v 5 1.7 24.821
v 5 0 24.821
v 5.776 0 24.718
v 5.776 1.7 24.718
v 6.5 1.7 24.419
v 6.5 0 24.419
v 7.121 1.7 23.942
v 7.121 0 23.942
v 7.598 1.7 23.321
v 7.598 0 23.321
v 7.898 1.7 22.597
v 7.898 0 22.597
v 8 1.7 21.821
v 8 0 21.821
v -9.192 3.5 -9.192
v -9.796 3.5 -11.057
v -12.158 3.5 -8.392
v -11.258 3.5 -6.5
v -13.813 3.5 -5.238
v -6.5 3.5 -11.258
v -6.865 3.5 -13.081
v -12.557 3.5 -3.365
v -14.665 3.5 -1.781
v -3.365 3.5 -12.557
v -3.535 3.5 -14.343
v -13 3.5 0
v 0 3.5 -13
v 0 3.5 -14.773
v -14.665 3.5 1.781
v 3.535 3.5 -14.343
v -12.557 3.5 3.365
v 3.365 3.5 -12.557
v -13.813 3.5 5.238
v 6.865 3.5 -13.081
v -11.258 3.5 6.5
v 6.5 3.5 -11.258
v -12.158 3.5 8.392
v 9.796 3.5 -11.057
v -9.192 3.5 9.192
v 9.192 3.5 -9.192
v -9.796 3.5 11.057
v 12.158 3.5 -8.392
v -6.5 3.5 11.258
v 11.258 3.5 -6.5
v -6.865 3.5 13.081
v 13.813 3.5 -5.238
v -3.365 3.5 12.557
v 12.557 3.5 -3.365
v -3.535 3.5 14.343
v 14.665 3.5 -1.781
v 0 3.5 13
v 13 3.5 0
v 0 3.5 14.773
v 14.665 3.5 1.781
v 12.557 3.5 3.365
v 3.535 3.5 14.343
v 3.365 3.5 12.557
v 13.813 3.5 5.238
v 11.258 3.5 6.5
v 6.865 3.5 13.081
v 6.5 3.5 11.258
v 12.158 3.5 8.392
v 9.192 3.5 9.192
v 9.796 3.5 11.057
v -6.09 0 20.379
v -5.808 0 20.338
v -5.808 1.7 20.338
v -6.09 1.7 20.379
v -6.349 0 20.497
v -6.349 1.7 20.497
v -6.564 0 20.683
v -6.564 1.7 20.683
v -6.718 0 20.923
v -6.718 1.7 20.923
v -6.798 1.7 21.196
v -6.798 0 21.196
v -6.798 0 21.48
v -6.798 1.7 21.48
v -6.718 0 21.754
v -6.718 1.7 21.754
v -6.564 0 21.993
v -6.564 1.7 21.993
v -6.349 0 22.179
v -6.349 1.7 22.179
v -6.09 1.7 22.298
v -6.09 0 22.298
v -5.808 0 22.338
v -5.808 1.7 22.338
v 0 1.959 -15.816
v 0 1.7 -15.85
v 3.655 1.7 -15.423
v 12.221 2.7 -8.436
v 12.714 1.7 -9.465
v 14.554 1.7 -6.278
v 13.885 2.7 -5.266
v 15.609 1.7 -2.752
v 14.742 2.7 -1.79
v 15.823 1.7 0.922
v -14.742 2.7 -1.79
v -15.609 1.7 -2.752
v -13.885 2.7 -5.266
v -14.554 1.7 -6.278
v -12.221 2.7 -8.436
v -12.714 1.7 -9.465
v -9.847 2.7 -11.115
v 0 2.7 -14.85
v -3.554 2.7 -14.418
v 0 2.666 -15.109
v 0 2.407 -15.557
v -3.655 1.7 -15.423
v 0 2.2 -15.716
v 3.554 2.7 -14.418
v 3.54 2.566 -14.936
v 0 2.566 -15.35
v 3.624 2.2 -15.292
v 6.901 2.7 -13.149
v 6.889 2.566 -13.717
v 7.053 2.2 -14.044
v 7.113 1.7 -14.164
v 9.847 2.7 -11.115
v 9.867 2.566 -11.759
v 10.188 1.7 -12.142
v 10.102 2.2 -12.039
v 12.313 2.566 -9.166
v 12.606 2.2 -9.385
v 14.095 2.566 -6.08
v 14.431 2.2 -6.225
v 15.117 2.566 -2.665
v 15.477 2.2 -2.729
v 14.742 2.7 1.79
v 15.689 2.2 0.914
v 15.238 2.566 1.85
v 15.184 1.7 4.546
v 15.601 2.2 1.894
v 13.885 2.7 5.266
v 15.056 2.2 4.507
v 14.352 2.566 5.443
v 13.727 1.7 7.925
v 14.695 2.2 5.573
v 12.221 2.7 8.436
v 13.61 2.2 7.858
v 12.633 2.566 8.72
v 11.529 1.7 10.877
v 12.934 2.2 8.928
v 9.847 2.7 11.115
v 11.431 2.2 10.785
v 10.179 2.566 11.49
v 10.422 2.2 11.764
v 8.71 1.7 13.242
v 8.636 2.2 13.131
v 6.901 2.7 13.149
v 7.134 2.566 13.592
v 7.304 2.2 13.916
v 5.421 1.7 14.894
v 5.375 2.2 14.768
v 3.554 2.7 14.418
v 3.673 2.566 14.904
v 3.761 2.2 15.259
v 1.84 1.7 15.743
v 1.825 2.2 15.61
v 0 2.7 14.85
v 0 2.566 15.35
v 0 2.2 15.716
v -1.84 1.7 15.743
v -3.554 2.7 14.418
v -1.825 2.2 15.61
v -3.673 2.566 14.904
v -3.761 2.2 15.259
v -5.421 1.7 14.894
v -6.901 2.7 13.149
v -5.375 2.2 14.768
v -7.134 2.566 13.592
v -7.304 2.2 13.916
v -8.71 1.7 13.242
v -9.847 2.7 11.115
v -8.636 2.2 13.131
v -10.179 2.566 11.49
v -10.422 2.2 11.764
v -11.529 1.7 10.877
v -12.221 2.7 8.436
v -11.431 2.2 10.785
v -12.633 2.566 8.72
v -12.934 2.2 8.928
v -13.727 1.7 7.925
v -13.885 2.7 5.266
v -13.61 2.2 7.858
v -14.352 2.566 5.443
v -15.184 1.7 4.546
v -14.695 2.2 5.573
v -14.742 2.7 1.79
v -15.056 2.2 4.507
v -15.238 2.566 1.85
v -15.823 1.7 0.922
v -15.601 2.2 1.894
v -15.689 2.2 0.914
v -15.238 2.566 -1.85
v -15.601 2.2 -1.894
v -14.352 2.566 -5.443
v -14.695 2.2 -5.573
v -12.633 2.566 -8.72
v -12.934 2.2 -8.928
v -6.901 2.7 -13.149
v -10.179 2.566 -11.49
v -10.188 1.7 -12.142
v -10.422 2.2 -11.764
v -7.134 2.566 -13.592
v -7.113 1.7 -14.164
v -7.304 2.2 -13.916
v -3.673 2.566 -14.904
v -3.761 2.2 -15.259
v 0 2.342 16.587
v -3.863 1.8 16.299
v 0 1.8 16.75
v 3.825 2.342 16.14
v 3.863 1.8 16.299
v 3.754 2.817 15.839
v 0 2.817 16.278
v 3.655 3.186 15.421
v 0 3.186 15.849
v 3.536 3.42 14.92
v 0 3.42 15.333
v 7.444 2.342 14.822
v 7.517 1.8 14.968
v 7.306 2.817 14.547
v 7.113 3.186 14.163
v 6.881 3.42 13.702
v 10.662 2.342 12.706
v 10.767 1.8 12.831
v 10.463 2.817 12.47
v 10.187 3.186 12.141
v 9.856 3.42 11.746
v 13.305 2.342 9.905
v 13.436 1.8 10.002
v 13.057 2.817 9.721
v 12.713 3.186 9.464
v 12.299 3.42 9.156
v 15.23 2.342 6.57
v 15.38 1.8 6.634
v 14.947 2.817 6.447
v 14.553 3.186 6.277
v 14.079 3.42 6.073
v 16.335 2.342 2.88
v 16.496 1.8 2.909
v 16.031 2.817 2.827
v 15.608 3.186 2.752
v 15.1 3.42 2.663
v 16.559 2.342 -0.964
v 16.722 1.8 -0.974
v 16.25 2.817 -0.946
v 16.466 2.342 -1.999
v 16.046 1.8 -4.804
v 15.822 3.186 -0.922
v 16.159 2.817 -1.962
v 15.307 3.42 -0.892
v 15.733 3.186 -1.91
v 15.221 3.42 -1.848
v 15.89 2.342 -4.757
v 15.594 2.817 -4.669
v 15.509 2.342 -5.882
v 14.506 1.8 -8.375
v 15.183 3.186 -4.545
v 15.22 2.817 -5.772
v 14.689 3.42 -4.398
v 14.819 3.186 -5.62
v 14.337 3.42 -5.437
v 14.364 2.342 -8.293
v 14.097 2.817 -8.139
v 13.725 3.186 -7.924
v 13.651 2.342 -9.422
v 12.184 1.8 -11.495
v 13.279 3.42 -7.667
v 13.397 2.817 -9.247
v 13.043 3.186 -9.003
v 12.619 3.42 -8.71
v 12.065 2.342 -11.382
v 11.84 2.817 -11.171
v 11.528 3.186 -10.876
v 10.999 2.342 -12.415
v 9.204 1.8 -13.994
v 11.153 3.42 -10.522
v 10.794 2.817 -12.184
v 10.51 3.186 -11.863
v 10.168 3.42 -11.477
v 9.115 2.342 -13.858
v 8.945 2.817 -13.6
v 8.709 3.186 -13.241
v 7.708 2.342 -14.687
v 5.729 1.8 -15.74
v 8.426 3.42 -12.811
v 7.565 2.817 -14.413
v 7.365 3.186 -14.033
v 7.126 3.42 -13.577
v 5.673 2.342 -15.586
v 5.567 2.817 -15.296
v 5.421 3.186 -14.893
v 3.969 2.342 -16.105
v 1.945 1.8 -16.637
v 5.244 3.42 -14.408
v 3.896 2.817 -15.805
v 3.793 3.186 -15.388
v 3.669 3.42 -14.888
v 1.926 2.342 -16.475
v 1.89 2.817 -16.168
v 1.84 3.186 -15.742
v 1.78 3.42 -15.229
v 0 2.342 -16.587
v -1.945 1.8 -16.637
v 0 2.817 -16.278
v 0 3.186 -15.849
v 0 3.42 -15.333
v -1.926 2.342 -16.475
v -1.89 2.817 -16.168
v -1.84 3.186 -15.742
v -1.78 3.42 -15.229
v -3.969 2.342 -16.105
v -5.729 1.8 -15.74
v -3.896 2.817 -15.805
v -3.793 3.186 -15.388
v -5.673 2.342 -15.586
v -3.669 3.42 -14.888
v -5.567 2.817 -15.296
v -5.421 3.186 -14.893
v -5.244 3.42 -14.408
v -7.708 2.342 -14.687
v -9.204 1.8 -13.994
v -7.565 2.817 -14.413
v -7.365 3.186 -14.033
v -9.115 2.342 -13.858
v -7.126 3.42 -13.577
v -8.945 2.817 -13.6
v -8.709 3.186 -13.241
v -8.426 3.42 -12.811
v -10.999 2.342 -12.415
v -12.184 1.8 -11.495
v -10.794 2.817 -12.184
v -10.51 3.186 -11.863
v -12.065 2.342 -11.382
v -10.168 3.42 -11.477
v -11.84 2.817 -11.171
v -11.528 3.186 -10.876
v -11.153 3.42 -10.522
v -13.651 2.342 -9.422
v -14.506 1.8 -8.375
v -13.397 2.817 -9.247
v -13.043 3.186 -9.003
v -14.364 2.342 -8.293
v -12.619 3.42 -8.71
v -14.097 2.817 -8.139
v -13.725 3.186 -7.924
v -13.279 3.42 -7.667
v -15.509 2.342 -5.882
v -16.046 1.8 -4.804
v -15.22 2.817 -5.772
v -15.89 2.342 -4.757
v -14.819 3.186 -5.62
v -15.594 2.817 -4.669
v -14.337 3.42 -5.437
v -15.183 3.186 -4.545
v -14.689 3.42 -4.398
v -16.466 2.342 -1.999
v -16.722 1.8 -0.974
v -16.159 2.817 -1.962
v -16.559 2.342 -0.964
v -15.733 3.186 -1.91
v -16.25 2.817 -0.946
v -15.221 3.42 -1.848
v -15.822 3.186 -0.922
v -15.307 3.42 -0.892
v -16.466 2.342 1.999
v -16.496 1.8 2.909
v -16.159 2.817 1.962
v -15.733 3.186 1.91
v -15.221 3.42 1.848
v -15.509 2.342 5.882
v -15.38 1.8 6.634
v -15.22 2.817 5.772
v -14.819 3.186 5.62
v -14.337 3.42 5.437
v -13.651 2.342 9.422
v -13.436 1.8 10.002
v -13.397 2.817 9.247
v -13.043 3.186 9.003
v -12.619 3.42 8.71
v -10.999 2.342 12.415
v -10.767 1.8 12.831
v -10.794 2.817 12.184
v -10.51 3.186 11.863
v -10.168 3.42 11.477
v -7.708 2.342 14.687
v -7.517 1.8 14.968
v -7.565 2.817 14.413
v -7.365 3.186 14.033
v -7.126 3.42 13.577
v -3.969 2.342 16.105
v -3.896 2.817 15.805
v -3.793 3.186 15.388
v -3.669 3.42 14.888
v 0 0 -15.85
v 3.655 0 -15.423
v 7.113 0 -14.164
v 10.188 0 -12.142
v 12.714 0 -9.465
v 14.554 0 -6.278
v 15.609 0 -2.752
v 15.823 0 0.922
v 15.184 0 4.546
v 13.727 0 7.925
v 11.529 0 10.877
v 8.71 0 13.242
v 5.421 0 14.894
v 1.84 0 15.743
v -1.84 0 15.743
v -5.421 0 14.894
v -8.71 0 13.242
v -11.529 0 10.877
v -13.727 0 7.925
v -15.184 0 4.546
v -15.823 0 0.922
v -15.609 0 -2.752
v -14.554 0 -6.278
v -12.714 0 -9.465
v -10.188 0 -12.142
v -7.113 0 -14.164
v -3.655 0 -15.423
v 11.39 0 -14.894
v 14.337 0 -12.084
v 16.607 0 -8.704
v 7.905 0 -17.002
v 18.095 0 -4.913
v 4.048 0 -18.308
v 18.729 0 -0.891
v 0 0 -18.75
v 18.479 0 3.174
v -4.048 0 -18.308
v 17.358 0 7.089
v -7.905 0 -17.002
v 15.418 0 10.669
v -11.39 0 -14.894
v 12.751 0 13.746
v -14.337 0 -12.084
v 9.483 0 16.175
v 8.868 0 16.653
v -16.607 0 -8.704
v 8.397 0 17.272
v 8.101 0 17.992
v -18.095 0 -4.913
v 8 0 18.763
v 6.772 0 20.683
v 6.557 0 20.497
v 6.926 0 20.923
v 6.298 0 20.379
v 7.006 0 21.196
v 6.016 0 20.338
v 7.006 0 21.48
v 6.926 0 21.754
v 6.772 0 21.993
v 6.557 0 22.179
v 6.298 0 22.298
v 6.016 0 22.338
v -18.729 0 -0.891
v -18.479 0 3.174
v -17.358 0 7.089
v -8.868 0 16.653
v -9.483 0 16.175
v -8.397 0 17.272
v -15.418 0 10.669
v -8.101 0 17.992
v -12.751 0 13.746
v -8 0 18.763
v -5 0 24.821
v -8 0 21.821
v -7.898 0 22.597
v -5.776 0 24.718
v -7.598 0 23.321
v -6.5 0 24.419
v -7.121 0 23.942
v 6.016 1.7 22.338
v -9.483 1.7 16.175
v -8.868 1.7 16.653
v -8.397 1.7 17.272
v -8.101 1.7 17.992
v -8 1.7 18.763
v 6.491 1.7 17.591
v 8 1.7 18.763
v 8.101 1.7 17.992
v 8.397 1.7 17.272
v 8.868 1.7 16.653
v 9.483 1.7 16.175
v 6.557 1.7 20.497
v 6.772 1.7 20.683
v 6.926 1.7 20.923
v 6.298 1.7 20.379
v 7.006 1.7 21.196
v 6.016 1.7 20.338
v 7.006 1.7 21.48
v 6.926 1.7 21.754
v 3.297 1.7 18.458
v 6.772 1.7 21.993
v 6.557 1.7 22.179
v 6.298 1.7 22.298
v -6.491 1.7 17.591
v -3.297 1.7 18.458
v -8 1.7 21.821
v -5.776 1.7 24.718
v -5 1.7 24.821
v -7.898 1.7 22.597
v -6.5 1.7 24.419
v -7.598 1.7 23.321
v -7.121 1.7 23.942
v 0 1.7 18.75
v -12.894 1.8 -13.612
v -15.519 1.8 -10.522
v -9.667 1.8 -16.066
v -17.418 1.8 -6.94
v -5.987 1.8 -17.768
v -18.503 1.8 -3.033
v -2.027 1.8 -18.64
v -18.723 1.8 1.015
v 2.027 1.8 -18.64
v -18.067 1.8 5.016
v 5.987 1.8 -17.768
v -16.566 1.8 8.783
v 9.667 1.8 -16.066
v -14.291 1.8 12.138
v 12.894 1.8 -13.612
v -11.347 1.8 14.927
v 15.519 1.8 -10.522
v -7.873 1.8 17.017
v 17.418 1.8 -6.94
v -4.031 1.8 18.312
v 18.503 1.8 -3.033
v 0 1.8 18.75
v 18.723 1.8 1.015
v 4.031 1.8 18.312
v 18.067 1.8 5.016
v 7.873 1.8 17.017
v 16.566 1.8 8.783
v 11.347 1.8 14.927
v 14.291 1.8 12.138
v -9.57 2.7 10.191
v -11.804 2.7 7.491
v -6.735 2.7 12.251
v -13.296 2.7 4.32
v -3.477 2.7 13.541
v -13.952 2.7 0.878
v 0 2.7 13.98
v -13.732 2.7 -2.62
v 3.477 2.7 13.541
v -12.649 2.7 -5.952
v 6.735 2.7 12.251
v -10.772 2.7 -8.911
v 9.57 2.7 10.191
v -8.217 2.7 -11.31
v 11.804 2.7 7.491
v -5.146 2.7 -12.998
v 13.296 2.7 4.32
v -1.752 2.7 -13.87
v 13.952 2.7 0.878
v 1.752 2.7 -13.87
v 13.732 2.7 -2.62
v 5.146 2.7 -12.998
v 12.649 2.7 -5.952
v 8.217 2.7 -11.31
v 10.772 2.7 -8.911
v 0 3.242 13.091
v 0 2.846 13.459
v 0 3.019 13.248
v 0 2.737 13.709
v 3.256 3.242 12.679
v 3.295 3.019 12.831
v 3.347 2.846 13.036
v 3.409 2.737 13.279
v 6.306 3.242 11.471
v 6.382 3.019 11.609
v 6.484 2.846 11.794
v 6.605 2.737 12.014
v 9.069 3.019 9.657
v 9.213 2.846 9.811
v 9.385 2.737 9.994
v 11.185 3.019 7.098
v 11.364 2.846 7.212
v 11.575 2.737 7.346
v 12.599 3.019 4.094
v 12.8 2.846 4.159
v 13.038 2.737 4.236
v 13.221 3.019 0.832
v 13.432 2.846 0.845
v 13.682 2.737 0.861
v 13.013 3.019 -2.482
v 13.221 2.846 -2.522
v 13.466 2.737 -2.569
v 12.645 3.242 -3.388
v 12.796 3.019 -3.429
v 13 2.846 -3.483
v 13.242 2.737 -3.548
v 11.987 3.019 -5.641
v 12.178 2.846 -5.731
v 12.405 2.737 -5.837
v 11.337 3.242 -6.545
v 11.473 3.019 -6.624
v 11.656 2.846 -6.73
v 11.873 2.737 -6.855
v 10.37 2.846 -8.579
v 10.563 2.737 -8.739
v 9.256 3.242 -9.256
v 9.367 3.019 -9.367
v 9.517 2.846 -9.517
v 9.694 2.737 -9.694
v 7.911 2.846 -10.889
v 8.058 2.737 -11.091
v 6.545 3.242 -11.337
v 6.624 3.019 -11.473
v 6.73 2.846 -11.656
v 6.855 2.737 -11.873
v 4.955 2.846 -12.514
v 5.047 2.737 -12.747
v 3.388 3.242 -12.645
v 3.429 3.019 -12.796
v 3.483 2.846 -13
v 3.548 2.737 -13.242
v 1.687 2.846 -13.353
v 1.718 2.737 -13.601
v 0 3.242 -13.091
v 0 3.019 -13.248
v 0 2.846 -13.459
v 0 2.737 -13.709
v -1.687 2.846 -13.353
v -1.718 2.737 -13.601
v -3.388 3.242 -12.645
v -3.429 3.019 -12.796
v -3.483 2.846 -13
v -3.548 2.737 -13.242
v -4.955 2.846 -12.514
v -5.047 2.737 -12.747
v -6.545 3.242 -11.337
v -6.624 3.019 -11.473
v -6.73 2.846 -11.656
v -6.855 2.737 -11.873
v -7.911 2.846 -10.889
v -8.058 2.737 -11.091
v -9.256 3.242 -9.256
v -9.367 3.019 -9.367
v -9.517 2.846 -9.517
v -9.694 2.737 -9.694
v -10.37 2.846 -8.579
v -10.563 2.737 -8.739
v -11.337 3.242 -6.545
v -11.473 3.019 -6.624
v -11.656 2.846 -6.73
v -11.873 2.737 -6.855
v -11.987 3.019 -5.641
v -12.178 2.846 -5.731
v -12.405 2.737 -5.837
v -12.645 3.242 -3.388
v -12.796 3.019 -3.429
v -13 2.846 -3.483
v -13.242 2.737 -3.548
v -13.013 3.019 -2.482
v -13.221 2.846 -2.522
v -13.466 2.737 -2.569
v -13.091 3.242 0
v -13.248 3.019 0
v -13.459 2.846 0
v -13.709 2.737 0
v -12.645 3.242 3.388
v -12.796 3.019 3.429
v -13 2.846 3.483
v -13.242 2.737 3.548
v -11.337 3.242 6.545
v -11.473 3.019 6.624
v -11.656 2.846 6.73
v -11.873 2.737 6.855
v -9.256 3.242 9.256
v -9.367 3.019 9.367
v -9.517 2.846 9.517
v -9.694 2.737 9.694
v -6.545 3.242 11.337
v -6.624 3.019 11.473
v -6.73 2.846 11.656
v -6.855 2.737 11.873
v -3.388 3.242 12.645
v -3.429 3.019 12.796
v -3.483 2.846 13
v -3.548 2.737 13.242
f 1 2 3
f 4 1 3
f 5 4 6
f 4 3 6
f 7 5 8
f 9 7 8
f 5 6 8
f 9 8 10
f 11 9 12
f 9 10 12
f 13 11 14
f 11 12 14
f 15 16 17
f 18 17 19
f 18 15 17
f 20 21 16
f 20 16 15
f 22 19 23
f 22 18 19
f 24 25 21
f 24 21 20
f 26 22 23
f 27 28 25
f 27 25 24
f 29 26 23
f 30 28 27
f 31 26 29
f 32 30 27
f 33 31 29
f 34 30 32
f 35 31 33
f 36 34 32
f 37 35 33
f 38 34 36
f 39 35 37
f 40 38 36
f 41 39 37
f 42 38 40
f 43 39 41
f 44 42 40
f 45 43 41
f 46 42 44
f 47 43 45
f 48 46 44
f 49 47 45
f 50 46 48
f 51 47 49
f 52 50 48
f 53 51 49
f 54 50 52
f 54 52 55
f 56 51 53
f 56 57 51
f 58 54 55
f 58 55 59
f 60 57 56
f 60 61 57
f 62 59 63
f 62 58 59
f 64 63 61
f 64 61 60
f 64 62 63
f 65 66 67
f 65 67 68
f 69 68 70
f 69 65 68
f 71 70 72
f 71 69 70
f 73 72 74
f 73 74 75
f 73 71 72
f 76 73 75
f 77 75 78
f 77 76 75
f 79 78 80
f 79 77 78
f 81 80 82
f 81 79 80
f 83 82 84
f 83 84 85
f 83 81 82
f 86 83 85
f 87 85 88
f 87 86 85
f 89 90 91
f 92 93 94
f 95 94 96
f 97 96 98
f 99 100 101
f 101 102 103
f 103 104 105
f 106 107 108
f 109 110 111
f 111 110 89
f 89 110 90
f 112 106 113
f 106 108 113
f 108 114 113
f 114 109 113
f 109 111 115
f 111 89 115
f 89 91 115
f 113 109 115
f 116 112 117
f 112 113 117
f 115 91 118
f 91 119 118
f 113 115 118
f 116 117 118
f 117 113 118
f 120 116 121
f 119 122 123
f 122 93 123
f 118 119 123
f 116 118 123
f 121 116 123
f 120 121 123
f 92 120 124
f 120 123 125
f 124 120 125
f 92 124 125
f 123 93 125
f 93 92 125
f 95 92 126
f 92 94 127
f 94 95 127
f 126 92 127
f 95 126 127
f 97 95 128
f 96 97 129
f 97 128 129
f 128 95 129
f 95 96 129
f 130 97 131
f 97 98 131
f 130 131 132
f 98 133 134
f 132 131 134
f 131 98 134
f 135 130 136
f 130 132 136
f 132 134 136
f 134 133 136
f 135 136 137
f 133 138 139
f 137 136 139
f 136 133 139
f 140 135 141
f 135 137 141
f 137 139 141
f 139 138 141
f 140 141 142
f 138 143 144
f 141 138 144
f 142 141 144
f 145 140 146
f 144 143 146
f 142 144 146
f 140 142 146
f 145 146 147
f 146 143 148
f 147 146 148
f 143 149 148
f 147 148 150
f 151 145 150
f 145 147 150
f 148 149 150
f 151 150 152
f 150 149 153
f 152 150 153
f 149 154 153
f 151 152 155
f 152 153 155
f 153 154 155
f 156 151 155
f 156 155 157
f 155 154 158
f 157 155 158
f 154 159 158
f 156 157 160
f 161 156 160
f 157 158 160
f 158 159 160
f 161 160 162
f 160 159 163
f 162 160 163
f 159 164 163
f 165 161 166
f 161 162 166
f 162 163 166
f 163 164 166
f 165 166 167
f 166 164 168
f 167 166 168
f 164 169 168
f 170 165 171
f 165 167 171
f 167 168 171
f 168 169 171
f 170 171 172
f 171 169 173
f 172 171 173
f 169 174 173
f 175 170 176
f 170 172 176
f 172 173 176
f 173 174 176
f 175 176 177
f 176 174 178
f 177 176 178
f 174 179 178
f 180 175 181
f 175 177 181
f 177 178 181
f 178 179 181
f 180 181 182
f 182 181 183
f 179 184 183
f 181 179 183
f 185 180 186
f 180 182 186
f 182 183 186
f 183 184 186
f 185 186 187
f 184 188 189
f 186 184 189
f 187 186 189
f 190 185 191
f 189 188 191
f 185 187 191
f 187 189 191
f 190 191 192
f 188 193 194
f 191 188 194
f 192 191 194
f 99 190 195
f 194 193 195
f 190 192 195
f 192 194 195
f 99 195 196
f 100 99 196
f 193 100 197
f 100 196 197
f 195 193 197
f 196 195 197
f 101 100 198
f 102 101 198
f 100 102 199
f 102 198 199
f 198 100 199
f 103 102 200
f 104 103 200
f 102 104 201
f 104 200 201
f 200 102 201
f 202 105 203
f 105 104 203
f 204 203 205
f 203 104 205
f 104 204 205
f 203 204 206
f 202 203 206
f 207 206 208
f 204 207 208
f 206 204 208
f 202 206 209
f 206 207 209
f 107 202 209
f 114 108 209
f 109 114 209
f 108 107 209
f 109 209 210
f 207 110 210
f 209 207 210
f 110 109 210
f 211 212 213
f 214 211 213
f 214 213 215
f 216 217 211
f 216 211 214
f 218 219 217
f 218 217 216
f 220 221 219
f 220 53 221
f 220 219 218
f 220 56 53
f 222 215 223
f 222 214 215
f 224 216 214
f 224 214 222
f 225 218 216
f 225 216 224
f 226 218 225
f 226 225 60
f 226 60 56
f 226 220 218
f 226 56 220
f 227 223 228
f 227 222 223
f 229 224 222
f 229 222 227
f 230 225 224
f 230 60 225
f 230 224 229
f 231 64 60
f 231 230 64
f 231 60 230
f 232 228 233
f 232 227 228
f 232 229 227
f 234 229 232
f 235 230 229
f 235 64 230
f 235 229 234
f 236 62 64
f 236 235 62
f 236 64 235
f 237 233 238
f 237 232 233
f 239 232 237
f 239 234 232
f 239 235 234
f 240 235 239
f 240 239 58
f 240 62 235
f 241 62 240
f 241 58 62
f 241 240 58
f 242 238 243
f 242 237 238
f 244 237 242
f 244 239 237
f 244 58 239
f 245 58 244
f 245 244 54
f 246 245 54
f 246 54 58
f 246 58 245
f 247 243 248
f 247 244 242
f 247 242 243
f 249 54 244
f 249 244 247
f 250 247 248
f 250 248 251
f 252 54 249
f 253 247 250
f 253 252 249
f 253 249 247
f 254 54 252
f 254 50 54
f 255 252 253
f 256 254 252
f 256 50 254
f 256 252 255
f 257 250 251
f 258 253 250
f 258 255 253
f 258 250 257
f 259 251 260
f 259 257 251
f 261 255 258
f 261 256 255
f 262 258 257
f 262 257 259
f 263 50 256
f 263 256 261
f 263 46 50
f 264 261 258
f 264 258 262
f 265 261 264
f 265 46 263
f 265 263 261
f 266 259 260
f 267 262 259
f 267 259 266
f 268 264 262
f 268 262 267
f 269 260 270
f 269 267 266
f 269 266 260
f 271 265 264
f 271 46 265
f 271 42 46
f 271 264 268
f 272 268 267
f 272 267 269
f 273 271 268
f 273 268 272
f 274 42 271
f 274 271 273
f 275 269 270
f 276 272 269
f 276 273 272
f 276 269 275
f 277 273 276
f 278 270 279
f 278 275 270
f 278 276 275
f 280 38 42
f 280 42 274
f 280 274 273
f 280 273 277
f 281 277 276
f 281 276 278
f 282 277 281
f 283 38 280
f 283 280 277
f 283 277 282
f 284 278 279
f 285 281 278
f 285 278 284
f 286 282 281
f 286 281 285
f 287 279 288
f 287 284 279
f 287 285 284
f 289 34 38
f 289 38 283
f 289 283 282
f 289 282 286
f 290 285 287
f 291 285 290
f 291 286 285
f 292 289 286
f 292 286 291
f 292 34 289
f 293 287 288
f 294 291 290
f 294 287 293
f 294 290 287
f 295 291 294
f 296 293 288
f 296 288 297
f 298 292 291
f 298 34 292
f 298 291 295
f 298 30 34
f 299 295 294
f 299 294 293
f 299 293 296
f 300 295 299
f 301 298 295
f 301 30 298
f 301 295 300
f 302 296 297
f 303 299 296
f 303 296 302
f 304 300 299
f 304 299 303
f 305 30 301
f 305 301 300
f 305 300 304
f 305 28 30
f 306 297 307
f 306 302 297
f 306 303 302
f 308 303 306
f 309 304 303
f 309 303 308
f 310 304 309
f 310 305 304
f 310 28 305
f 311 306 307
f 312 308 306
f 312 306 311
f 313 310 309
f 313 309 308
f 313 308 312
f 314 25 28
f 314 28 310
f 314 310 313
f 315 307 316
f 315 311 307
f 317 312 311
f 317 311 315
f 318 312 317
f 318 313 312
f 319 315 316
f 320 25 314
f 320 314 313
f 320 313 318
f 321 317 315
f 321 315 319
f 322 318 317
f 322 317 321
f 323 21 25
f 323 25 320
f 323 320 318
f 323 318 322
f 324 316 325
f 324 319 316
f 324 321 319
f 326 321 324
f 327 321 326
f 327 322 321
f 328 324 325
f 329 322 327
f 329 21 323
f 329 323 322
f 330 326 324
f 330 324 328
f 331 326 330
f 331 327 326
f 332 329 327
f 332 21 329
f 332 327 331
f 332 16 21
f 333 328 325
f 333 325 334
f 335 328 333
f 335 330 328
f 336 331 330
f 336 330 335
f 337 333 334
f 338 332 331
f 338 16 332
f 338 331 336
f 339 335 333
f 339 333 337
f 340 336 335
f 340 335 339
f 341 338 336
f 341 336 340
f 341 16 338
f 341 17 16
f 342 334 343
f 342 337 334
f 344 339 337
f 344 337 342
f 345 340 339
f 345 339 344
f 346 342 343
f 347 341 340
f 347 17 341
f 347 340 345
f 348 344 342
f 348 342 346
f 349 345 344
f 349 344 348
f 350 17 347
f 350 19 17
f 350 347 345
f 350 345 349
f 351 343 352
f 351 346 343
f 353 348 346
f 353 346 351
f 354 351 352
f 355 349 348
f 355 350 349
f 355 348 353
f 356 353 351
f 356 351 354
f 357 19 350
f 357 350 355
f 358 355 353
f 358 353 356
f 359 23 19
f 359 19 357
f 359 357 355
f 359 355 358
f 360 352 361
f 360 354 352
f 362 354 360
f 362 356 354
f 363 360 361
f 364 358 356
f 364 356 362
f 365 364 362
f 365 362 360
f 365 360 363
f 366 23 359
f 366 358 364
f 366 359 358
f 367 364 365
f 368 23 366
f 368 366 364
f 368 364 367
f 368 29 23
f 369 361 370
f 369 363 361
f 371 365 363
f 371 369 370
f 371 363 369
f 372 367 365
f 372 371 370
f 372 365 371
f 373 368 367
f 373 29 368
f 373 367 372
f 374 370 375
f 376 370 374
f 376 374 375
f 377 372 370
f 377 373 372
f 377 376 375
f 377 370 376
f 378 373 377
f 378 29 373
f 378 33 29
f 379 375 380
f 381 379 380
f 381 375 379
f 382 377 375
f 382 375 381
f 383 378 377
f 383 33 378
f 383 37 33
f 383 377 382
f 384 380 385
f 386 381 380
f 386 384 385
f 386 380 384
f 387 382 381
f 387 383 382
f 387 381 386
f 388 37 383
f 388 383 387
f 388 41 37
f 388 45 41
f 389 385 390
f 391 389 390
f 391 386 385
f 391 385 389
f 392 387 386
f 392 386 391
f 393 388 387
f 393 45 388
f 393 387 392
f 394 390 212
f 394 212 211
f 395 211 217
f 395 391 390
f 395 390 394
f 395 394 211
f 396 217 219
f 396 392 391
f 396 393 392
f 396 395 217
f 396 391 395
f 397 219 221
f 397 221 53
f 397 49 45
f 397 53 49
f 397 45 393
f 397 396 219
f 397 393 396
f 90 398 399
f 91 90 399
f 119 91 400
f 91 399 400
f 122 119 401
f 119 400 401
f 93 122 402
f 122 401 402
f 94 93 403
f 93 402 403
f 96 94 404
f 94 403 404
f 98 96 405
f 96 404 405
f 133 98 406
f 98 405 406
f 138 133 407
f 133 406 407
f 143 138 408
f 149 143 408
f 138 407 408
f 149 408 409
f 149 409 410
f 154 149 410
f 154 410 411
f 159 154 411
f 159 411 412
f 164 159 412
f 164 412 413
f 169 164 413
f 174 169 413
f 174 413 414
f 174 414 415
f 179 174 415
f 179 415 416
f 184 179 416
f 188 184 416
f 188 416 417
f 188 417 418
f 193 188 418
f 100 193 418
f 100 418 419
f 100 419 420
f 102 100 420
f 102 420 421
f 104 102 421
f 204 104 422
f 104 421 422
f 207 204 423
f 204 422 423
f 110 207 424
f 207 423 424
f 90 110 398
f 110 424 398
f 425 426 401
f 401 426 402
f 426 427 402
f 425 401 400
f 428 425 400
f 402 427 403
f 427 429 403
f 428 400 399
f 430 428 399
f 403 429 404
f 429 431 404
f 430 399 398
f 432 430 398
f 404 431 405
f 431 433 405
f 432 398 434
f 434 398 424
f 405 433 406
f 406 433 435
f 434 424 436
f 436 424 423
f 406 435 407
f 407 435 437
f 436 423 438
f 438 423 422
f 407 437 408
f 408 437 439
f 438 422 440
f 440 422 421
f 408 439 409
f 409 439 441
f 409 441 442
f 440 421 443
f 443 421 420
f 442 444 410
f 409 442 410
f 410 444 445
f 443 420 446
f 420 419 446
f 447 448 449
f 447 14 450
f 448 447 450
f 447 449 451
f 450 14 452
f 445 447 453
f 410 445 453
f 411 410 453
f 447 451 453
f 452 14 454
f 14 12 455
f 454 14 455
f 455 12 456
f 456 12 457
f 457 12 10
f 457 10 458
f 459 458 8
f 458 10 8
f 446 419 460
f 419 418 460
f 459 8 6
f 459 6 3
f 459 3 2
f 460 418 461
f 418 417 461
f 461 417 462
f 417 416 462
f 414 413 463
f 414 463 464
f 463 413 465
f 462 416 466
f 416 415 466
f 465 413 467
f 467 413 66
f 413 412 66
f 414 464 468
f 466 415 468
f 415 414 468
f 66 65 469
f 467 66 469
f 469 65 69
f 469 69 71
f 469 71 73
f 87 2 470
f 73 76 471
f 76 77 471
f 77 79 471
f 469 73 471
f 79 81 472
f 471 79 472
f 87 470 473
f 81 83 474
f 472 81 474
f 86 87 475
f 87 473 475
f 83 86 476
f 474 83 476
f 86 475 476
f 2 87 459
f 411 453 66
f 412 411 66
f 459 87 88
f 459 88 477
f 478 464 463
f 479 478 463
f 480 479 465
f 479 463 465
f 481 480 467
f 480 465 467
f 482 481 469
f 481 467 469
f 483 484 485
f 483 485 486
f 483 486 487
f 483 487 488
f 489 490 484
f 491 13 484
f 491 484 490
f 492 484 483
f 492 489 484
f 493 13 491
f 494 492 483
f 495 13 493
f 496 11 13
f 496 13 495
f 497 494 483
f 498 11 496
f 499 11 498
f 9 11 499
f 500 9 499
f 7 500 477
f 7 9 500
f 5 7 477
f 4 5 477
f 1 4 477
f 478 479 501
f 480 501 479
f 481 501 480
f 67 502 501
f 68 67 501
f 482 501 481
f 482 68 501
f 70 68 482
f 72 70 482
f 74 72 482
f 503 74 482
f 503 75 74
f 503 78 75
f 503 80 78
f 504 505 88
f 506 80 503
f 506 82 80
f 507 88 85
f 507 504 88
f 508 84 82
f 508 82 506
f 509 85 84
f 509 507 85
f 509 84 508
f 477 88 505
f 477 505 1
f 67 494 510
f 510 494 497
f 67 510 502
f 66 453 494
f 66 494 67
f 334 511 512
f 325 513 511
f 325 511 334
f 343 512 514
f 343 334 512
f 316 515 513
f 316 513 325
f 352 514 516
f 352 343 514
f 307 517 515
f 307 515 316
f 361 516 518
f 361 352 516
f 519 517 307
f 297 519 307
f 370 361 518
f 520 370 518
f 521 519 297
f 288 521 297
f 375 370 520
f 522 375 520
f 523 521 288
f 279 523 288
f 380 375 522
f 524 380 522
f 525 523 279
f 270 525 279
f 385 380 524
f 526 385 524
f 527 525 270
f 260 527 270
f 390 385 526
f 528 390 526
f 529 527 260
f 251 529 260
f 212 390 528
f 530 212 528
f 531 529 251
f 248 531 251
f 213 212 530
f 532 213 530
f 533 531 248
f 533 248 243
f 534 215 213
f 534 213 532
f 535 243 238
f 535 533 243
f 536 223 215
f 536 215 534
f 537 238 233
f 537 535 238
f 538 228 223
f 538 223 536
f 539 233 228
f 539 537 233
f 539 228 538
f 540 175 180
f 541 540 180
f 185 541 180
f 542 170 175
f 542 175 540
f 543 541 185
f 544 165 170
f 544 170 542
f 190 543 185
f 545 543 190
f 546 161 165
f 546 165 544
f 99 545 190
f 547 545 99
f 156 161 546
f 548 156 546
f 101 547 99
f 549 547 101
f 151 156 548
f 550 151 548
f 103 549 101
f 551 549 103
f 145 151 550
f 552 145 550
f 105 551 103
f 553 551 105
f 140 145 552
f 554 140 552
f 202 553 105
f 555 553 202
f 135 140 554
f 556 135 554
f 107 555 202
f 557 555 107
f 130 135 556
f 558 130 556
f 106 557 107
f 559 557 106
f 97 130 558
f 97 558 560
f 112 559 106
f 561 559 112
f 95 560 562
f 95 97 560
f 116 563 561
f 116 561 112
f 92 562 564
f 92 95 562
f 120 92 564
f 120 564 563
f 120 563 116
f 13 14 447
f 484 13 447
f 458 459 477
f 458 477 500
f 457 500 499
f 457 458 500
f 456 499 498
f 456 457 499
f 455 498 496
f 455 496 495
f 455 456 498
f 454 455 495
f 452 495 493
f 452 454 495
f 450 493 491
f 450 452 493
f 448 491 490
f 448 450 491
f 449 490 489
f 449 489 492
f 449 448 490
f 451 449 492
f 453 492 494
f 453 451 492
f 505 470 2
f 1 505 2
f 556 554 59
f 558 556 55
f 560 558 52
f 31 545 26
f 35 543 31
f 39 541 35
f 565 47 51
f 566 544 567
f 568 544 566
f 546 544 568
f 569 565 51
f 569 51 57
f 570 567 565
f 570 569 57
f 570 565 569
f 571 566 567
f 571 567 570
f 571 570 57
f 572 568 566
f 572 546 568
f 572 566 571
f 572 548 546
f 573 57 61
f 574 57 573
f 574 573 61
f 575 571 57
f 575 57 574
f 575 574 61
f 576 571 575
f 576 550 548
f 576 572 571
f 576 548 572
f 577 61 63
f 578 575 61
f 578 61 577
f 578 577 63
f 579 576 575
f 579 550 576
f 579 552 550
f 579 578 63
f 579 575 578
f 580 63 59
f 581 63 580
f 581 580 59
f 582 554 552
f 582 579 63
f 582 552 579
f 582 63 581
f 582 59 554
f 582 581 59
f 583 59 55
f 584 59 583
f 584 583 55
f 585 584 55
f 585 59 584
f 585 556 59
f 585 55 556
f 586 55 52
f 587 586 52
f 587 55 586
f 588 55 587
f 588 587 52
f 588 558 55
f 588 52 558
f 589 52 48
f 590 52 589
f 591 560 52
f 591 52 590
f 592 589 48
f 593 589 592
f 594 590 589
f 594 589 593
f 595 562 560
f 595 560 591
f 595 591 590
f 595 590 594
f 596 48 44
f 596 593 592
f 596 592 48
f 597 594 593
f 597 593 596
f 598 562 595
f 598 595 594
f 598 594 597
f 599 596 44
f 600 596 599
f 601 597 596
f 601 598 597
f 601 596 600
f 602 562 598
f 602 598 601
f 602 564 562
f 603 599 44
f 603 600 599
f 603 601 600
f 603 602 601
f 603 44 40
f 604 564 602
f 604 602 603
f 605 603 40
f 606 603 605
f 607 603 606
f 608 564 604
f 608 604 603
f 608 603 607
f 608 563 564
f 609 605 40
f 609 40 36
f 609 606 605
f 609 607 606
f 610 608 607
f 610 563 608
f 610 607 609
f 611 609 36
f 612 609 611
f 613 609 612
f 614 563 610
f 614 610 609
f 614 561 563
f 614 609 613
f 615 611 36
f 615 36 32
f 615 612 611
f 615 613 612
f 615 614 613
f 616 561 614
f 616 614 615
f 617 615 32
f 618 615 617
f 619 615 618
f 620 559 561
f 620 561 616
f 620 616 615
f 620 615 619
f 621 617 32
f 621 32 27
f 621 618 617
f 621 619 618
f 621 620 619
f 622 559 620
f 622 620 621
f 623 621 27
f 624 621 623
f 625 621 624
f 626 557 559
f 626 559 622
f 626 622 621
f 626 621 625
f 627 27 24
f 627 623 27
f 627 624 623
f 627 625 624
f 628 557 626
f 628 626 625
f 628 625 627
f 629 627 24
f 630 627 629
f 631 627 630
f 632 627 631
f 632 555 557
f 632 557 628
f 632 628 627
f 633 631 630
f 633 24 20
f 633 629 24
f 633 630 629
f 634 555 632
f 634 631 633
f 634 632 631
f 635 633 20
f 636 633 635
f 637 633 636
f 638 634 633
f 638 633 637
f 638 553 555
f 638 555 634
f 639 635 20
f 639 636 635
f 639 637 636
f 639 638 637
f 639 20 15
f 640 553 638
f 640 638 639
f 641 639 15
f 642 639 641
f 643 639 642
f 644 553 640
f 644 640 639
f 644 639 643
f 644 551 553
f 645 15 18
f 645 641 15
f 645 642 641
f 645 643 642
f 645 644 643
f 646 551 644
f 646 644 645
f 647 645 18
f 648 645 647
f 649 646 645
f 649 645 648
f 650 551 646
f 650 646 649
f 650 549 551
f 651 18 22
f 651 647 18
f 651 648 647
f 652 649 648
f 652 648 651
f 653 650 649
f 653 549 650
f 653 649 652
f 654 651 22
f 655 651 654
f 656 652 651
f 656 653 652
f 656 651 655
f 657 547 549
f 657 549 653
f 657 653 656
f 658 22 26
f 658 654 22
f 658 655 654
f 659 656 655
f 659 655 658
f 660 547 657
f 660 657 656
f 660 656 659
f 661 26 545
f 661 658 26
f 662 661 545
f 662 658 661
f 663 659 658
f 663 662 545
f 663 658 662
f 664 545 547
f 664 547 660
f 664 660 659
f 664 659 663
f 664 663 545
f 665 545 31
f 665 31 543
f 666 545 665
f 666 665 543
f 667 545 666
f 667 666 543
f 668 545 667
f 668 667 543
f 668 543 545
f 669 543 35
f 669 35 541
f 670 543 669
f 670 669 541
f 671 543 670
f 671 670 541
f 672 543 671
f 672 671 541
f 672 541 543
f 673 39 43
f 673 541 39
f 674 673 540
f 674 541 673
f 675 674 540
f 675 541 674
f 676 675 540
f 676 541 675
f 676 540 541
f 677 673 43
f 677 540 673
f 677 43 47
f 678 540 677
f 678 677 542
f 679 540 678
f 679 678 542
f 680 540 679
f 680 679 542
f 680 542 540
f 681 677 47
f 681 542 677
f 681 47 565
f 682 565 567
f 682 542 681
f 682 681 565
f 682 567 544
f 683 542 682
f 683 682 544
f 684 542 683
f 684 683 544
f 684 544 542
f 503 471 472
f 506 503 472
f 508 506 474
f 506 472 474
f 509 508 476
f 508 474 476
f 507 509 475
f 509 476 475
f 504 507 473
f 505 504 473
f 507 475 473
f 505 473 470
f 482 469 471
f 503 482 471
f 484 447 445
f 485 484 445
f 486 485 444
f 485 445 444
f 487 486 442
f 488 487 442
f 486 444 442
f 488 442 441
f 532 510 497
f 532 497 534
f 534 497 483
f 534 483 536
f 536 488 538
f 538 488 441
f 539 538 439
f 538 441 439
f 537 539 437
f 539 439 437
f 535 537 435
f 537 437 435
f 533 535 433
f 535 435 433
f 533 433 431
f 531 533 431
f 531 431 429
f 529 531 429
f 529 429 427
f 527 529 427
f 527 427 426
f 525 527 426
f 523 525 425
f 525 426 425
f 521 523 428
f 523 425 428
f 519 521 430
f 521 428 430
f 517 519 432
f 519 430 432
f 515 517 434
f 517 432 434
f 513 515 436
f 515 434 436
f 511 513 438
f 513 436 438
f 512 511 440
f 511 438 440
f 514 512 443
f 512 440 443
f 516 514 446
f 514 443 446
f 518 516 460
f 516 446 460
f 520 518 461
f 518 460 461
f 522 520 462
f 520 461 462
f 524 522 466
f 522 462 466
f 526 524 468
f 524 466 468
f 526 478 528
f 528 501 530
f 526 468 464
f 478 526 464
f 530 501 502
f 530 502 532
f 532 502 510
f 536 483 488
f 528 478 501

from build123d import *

# Parameters (mm, degrees)
SKETCH1_R           = 18.75
BOSS_EXTRUDE1_DEPTH = 1.8
SKETCH2_R           = 16.75
BOSS_EXTRUDE2_DEPTH = 1.7
SKETCH3_R           = 13
CUT_EXTRUDE1_DEPTH  = 5.7
FILLET1_R           = 2
SKETCH4_R           = 15.85
CUT_EXTRUDE2_DEPTH  = 2.7
FILLET2_R           = 1
BOSS_EXTRUDE3_DEPTH = 1.7


with BuildPart() as part:
    # Sketch1 → Boss-Extrude1 (new body)
    with BuildSketch(Plane(origin=(0, 0, 0), x_dir=(1, 0, 0), z_dir=(0, 1, 0))):
        with Locations(Location((0, 0, 0), (0, 0, 270))):
            Circle(SKETCH1_R)
    extrude(amount=BOSS_EXTRUDE1_DEPTH)

    # Sketch2 → Boss-Extrude2 (add)
    with BuildSketch(Plane(origin=(0, 1.8, 0), x_dir=(1, 0, 0), z_dir=(0, 1, 0))):
        with Locations(Location((0, 0, 0), (0, 0, 270))):
            Circle(SKETCH2_R)
    extrude(amount=BOSS_EXTRUDE2_DEPTH)

    # Sketch3 → Cut-Extrude1 (cut)
    with BuildSketch(Plane(origin=(0, 3.5, 0), x_dir=(1, 0, 0), z_dir=(0, 1, 0))):
        with Locations(Location((0, 0, 0), (0, 0, 270))):
            Circle(SKETCH3_R)
    extrude(amount=-CUT_EXTRUDE1_DEPTH, mode=Mode.SUBTRACT)

    # Fillet1
    # the kernel refuses this fillet: 2 mm, written as the material it takes off along each edge
    with BuildSketch(Plane(origin=(0, 3.5, 0), x_dir=(0, 0, 1), z_dir=(-1, 0, 0))) as fillet1_piece_1:
        with BuildLine():
            CenterArc((14.772628007, -2), FILLET1_R, 8.626926559, 81.373073441)
            Line((14.772628007, 0), (14.772628007, 0.04))
            Line((14.772628007, 0.04), (16.75, 0.04))
            Line((16.75, 0.04), (16.79, 0))
            ThreePointArc((16.79, 0), (16.79, -0.85), (16.78954744, -1.694))
            Line((16.78954744, -1.694), (16.75, -1.7))
        make_face()
    revolve(axis=Axis((0, 3.5, 0), (0, 1, 0)), mode=Mode.SUBTRACT)

    # Sketch4 → Cut-Extrude2 (cut)
    with BuildSketch(Plane.XZ):
        with Locations(Location((0, 0, 0), (0, 0, 270))):
            Circle(SKETCH4_R)
    extrude(amount=-CUT_EXTRUDE2_DEPTH, mode=Mode.SUBTRACT)

    # Fillet2
    # the kernel refuses this fillet: 1 mm, written as the material it adds along each edge
    with BuildSketch(Plane(origin=(0, 2.7, 0), x_dir=(0, 0, -1), z_dir=(-1, 0, 0))) as fillet2_piece_1:
        with BuildLine():
            CenterArc((15.85 - FILLET2_R, FILLET2_R), FILLET2_R, 270, 90)
            Line((15.85 - FILLET2_R, 0), (15.85, 0))
            Line((15.85, 0), (15.85, FILLET2_R))
        make_face()
    revolve(axis=Axis((0, 2.7, 0), (0, -1, 0)))
    # the kernel refuses this fillet: 1 mm, written as the material it takes off along each edge
    with BuildSketch(Plane(origin=(0, 2.7, 0), x_dir=(0, 0, 1), z_dir=(-1, 0, 0))) as fillet2_2_piece_1:
        with BuildLine():
            CenterArc((13.979795897, 1), FILLET2_R, 191.536959033, 78.463040967)
            Line((13, 0.8), (13, 0))
            Line((13, 0), (13.979795897, 0))
        make_face()
    revolve(axis=Axis((0, 2.7, 0), (0, 1, 0)), mode=Mode.SUBTRACT)

    # Sketch5 → Boss-Extrude3 (add)
    with BuildSketch(Plane.XZ):
        with BuildLine():
            Line((-8, 18.763328596), (-8, 21.82057613))
            ThreePointArc((-8, 21.82057613), (-7.121320344, 23.941896474), (-5, 24.82057613))
            Line((-5, 24.82057613), (5, 24.82057613))
            ThreePointArc((5, 24.82057613), (7.121320344, 23.941896474), (8, 21.82057613))
            Line((8, 21.82057613), (8, 18.763328596))
            ThreePointArc((8, 18.763328596), (8.396951389, 17.271974201), (9.482758621, 16.175283272))
            ThreePointArc((9.482758621, 16.175283272), (0, 18.75), (-9.482758621, 16.175283272))
            ThreePointArc((-9.482758621, 16.175283272), (-8.396951389, 17.271974201), (-8, 18.763328596))
        make_face()
        with BuildLine():
            Line((-5.808489471, 22.338127717), (6.015887115, 22.338127717))
            ThreePointArc((6.015887115, 22.338127717), (7.015887115, 21.338127717), (6.015887115, 20.338127717))
            Line((6.015887115, 20.338127717), (-5.808489471, 20.338127717))
            ThreePointArc((-5.808489471, 20.338127717), (-6.808489471, 21.338127717), (-5.808489471, 22.338127717))
        make_face(mode=Mode.SUBTRACT)
    extrude(amount=-BOSS_EXTRUDE3_DEPTH)


solid = part.part
